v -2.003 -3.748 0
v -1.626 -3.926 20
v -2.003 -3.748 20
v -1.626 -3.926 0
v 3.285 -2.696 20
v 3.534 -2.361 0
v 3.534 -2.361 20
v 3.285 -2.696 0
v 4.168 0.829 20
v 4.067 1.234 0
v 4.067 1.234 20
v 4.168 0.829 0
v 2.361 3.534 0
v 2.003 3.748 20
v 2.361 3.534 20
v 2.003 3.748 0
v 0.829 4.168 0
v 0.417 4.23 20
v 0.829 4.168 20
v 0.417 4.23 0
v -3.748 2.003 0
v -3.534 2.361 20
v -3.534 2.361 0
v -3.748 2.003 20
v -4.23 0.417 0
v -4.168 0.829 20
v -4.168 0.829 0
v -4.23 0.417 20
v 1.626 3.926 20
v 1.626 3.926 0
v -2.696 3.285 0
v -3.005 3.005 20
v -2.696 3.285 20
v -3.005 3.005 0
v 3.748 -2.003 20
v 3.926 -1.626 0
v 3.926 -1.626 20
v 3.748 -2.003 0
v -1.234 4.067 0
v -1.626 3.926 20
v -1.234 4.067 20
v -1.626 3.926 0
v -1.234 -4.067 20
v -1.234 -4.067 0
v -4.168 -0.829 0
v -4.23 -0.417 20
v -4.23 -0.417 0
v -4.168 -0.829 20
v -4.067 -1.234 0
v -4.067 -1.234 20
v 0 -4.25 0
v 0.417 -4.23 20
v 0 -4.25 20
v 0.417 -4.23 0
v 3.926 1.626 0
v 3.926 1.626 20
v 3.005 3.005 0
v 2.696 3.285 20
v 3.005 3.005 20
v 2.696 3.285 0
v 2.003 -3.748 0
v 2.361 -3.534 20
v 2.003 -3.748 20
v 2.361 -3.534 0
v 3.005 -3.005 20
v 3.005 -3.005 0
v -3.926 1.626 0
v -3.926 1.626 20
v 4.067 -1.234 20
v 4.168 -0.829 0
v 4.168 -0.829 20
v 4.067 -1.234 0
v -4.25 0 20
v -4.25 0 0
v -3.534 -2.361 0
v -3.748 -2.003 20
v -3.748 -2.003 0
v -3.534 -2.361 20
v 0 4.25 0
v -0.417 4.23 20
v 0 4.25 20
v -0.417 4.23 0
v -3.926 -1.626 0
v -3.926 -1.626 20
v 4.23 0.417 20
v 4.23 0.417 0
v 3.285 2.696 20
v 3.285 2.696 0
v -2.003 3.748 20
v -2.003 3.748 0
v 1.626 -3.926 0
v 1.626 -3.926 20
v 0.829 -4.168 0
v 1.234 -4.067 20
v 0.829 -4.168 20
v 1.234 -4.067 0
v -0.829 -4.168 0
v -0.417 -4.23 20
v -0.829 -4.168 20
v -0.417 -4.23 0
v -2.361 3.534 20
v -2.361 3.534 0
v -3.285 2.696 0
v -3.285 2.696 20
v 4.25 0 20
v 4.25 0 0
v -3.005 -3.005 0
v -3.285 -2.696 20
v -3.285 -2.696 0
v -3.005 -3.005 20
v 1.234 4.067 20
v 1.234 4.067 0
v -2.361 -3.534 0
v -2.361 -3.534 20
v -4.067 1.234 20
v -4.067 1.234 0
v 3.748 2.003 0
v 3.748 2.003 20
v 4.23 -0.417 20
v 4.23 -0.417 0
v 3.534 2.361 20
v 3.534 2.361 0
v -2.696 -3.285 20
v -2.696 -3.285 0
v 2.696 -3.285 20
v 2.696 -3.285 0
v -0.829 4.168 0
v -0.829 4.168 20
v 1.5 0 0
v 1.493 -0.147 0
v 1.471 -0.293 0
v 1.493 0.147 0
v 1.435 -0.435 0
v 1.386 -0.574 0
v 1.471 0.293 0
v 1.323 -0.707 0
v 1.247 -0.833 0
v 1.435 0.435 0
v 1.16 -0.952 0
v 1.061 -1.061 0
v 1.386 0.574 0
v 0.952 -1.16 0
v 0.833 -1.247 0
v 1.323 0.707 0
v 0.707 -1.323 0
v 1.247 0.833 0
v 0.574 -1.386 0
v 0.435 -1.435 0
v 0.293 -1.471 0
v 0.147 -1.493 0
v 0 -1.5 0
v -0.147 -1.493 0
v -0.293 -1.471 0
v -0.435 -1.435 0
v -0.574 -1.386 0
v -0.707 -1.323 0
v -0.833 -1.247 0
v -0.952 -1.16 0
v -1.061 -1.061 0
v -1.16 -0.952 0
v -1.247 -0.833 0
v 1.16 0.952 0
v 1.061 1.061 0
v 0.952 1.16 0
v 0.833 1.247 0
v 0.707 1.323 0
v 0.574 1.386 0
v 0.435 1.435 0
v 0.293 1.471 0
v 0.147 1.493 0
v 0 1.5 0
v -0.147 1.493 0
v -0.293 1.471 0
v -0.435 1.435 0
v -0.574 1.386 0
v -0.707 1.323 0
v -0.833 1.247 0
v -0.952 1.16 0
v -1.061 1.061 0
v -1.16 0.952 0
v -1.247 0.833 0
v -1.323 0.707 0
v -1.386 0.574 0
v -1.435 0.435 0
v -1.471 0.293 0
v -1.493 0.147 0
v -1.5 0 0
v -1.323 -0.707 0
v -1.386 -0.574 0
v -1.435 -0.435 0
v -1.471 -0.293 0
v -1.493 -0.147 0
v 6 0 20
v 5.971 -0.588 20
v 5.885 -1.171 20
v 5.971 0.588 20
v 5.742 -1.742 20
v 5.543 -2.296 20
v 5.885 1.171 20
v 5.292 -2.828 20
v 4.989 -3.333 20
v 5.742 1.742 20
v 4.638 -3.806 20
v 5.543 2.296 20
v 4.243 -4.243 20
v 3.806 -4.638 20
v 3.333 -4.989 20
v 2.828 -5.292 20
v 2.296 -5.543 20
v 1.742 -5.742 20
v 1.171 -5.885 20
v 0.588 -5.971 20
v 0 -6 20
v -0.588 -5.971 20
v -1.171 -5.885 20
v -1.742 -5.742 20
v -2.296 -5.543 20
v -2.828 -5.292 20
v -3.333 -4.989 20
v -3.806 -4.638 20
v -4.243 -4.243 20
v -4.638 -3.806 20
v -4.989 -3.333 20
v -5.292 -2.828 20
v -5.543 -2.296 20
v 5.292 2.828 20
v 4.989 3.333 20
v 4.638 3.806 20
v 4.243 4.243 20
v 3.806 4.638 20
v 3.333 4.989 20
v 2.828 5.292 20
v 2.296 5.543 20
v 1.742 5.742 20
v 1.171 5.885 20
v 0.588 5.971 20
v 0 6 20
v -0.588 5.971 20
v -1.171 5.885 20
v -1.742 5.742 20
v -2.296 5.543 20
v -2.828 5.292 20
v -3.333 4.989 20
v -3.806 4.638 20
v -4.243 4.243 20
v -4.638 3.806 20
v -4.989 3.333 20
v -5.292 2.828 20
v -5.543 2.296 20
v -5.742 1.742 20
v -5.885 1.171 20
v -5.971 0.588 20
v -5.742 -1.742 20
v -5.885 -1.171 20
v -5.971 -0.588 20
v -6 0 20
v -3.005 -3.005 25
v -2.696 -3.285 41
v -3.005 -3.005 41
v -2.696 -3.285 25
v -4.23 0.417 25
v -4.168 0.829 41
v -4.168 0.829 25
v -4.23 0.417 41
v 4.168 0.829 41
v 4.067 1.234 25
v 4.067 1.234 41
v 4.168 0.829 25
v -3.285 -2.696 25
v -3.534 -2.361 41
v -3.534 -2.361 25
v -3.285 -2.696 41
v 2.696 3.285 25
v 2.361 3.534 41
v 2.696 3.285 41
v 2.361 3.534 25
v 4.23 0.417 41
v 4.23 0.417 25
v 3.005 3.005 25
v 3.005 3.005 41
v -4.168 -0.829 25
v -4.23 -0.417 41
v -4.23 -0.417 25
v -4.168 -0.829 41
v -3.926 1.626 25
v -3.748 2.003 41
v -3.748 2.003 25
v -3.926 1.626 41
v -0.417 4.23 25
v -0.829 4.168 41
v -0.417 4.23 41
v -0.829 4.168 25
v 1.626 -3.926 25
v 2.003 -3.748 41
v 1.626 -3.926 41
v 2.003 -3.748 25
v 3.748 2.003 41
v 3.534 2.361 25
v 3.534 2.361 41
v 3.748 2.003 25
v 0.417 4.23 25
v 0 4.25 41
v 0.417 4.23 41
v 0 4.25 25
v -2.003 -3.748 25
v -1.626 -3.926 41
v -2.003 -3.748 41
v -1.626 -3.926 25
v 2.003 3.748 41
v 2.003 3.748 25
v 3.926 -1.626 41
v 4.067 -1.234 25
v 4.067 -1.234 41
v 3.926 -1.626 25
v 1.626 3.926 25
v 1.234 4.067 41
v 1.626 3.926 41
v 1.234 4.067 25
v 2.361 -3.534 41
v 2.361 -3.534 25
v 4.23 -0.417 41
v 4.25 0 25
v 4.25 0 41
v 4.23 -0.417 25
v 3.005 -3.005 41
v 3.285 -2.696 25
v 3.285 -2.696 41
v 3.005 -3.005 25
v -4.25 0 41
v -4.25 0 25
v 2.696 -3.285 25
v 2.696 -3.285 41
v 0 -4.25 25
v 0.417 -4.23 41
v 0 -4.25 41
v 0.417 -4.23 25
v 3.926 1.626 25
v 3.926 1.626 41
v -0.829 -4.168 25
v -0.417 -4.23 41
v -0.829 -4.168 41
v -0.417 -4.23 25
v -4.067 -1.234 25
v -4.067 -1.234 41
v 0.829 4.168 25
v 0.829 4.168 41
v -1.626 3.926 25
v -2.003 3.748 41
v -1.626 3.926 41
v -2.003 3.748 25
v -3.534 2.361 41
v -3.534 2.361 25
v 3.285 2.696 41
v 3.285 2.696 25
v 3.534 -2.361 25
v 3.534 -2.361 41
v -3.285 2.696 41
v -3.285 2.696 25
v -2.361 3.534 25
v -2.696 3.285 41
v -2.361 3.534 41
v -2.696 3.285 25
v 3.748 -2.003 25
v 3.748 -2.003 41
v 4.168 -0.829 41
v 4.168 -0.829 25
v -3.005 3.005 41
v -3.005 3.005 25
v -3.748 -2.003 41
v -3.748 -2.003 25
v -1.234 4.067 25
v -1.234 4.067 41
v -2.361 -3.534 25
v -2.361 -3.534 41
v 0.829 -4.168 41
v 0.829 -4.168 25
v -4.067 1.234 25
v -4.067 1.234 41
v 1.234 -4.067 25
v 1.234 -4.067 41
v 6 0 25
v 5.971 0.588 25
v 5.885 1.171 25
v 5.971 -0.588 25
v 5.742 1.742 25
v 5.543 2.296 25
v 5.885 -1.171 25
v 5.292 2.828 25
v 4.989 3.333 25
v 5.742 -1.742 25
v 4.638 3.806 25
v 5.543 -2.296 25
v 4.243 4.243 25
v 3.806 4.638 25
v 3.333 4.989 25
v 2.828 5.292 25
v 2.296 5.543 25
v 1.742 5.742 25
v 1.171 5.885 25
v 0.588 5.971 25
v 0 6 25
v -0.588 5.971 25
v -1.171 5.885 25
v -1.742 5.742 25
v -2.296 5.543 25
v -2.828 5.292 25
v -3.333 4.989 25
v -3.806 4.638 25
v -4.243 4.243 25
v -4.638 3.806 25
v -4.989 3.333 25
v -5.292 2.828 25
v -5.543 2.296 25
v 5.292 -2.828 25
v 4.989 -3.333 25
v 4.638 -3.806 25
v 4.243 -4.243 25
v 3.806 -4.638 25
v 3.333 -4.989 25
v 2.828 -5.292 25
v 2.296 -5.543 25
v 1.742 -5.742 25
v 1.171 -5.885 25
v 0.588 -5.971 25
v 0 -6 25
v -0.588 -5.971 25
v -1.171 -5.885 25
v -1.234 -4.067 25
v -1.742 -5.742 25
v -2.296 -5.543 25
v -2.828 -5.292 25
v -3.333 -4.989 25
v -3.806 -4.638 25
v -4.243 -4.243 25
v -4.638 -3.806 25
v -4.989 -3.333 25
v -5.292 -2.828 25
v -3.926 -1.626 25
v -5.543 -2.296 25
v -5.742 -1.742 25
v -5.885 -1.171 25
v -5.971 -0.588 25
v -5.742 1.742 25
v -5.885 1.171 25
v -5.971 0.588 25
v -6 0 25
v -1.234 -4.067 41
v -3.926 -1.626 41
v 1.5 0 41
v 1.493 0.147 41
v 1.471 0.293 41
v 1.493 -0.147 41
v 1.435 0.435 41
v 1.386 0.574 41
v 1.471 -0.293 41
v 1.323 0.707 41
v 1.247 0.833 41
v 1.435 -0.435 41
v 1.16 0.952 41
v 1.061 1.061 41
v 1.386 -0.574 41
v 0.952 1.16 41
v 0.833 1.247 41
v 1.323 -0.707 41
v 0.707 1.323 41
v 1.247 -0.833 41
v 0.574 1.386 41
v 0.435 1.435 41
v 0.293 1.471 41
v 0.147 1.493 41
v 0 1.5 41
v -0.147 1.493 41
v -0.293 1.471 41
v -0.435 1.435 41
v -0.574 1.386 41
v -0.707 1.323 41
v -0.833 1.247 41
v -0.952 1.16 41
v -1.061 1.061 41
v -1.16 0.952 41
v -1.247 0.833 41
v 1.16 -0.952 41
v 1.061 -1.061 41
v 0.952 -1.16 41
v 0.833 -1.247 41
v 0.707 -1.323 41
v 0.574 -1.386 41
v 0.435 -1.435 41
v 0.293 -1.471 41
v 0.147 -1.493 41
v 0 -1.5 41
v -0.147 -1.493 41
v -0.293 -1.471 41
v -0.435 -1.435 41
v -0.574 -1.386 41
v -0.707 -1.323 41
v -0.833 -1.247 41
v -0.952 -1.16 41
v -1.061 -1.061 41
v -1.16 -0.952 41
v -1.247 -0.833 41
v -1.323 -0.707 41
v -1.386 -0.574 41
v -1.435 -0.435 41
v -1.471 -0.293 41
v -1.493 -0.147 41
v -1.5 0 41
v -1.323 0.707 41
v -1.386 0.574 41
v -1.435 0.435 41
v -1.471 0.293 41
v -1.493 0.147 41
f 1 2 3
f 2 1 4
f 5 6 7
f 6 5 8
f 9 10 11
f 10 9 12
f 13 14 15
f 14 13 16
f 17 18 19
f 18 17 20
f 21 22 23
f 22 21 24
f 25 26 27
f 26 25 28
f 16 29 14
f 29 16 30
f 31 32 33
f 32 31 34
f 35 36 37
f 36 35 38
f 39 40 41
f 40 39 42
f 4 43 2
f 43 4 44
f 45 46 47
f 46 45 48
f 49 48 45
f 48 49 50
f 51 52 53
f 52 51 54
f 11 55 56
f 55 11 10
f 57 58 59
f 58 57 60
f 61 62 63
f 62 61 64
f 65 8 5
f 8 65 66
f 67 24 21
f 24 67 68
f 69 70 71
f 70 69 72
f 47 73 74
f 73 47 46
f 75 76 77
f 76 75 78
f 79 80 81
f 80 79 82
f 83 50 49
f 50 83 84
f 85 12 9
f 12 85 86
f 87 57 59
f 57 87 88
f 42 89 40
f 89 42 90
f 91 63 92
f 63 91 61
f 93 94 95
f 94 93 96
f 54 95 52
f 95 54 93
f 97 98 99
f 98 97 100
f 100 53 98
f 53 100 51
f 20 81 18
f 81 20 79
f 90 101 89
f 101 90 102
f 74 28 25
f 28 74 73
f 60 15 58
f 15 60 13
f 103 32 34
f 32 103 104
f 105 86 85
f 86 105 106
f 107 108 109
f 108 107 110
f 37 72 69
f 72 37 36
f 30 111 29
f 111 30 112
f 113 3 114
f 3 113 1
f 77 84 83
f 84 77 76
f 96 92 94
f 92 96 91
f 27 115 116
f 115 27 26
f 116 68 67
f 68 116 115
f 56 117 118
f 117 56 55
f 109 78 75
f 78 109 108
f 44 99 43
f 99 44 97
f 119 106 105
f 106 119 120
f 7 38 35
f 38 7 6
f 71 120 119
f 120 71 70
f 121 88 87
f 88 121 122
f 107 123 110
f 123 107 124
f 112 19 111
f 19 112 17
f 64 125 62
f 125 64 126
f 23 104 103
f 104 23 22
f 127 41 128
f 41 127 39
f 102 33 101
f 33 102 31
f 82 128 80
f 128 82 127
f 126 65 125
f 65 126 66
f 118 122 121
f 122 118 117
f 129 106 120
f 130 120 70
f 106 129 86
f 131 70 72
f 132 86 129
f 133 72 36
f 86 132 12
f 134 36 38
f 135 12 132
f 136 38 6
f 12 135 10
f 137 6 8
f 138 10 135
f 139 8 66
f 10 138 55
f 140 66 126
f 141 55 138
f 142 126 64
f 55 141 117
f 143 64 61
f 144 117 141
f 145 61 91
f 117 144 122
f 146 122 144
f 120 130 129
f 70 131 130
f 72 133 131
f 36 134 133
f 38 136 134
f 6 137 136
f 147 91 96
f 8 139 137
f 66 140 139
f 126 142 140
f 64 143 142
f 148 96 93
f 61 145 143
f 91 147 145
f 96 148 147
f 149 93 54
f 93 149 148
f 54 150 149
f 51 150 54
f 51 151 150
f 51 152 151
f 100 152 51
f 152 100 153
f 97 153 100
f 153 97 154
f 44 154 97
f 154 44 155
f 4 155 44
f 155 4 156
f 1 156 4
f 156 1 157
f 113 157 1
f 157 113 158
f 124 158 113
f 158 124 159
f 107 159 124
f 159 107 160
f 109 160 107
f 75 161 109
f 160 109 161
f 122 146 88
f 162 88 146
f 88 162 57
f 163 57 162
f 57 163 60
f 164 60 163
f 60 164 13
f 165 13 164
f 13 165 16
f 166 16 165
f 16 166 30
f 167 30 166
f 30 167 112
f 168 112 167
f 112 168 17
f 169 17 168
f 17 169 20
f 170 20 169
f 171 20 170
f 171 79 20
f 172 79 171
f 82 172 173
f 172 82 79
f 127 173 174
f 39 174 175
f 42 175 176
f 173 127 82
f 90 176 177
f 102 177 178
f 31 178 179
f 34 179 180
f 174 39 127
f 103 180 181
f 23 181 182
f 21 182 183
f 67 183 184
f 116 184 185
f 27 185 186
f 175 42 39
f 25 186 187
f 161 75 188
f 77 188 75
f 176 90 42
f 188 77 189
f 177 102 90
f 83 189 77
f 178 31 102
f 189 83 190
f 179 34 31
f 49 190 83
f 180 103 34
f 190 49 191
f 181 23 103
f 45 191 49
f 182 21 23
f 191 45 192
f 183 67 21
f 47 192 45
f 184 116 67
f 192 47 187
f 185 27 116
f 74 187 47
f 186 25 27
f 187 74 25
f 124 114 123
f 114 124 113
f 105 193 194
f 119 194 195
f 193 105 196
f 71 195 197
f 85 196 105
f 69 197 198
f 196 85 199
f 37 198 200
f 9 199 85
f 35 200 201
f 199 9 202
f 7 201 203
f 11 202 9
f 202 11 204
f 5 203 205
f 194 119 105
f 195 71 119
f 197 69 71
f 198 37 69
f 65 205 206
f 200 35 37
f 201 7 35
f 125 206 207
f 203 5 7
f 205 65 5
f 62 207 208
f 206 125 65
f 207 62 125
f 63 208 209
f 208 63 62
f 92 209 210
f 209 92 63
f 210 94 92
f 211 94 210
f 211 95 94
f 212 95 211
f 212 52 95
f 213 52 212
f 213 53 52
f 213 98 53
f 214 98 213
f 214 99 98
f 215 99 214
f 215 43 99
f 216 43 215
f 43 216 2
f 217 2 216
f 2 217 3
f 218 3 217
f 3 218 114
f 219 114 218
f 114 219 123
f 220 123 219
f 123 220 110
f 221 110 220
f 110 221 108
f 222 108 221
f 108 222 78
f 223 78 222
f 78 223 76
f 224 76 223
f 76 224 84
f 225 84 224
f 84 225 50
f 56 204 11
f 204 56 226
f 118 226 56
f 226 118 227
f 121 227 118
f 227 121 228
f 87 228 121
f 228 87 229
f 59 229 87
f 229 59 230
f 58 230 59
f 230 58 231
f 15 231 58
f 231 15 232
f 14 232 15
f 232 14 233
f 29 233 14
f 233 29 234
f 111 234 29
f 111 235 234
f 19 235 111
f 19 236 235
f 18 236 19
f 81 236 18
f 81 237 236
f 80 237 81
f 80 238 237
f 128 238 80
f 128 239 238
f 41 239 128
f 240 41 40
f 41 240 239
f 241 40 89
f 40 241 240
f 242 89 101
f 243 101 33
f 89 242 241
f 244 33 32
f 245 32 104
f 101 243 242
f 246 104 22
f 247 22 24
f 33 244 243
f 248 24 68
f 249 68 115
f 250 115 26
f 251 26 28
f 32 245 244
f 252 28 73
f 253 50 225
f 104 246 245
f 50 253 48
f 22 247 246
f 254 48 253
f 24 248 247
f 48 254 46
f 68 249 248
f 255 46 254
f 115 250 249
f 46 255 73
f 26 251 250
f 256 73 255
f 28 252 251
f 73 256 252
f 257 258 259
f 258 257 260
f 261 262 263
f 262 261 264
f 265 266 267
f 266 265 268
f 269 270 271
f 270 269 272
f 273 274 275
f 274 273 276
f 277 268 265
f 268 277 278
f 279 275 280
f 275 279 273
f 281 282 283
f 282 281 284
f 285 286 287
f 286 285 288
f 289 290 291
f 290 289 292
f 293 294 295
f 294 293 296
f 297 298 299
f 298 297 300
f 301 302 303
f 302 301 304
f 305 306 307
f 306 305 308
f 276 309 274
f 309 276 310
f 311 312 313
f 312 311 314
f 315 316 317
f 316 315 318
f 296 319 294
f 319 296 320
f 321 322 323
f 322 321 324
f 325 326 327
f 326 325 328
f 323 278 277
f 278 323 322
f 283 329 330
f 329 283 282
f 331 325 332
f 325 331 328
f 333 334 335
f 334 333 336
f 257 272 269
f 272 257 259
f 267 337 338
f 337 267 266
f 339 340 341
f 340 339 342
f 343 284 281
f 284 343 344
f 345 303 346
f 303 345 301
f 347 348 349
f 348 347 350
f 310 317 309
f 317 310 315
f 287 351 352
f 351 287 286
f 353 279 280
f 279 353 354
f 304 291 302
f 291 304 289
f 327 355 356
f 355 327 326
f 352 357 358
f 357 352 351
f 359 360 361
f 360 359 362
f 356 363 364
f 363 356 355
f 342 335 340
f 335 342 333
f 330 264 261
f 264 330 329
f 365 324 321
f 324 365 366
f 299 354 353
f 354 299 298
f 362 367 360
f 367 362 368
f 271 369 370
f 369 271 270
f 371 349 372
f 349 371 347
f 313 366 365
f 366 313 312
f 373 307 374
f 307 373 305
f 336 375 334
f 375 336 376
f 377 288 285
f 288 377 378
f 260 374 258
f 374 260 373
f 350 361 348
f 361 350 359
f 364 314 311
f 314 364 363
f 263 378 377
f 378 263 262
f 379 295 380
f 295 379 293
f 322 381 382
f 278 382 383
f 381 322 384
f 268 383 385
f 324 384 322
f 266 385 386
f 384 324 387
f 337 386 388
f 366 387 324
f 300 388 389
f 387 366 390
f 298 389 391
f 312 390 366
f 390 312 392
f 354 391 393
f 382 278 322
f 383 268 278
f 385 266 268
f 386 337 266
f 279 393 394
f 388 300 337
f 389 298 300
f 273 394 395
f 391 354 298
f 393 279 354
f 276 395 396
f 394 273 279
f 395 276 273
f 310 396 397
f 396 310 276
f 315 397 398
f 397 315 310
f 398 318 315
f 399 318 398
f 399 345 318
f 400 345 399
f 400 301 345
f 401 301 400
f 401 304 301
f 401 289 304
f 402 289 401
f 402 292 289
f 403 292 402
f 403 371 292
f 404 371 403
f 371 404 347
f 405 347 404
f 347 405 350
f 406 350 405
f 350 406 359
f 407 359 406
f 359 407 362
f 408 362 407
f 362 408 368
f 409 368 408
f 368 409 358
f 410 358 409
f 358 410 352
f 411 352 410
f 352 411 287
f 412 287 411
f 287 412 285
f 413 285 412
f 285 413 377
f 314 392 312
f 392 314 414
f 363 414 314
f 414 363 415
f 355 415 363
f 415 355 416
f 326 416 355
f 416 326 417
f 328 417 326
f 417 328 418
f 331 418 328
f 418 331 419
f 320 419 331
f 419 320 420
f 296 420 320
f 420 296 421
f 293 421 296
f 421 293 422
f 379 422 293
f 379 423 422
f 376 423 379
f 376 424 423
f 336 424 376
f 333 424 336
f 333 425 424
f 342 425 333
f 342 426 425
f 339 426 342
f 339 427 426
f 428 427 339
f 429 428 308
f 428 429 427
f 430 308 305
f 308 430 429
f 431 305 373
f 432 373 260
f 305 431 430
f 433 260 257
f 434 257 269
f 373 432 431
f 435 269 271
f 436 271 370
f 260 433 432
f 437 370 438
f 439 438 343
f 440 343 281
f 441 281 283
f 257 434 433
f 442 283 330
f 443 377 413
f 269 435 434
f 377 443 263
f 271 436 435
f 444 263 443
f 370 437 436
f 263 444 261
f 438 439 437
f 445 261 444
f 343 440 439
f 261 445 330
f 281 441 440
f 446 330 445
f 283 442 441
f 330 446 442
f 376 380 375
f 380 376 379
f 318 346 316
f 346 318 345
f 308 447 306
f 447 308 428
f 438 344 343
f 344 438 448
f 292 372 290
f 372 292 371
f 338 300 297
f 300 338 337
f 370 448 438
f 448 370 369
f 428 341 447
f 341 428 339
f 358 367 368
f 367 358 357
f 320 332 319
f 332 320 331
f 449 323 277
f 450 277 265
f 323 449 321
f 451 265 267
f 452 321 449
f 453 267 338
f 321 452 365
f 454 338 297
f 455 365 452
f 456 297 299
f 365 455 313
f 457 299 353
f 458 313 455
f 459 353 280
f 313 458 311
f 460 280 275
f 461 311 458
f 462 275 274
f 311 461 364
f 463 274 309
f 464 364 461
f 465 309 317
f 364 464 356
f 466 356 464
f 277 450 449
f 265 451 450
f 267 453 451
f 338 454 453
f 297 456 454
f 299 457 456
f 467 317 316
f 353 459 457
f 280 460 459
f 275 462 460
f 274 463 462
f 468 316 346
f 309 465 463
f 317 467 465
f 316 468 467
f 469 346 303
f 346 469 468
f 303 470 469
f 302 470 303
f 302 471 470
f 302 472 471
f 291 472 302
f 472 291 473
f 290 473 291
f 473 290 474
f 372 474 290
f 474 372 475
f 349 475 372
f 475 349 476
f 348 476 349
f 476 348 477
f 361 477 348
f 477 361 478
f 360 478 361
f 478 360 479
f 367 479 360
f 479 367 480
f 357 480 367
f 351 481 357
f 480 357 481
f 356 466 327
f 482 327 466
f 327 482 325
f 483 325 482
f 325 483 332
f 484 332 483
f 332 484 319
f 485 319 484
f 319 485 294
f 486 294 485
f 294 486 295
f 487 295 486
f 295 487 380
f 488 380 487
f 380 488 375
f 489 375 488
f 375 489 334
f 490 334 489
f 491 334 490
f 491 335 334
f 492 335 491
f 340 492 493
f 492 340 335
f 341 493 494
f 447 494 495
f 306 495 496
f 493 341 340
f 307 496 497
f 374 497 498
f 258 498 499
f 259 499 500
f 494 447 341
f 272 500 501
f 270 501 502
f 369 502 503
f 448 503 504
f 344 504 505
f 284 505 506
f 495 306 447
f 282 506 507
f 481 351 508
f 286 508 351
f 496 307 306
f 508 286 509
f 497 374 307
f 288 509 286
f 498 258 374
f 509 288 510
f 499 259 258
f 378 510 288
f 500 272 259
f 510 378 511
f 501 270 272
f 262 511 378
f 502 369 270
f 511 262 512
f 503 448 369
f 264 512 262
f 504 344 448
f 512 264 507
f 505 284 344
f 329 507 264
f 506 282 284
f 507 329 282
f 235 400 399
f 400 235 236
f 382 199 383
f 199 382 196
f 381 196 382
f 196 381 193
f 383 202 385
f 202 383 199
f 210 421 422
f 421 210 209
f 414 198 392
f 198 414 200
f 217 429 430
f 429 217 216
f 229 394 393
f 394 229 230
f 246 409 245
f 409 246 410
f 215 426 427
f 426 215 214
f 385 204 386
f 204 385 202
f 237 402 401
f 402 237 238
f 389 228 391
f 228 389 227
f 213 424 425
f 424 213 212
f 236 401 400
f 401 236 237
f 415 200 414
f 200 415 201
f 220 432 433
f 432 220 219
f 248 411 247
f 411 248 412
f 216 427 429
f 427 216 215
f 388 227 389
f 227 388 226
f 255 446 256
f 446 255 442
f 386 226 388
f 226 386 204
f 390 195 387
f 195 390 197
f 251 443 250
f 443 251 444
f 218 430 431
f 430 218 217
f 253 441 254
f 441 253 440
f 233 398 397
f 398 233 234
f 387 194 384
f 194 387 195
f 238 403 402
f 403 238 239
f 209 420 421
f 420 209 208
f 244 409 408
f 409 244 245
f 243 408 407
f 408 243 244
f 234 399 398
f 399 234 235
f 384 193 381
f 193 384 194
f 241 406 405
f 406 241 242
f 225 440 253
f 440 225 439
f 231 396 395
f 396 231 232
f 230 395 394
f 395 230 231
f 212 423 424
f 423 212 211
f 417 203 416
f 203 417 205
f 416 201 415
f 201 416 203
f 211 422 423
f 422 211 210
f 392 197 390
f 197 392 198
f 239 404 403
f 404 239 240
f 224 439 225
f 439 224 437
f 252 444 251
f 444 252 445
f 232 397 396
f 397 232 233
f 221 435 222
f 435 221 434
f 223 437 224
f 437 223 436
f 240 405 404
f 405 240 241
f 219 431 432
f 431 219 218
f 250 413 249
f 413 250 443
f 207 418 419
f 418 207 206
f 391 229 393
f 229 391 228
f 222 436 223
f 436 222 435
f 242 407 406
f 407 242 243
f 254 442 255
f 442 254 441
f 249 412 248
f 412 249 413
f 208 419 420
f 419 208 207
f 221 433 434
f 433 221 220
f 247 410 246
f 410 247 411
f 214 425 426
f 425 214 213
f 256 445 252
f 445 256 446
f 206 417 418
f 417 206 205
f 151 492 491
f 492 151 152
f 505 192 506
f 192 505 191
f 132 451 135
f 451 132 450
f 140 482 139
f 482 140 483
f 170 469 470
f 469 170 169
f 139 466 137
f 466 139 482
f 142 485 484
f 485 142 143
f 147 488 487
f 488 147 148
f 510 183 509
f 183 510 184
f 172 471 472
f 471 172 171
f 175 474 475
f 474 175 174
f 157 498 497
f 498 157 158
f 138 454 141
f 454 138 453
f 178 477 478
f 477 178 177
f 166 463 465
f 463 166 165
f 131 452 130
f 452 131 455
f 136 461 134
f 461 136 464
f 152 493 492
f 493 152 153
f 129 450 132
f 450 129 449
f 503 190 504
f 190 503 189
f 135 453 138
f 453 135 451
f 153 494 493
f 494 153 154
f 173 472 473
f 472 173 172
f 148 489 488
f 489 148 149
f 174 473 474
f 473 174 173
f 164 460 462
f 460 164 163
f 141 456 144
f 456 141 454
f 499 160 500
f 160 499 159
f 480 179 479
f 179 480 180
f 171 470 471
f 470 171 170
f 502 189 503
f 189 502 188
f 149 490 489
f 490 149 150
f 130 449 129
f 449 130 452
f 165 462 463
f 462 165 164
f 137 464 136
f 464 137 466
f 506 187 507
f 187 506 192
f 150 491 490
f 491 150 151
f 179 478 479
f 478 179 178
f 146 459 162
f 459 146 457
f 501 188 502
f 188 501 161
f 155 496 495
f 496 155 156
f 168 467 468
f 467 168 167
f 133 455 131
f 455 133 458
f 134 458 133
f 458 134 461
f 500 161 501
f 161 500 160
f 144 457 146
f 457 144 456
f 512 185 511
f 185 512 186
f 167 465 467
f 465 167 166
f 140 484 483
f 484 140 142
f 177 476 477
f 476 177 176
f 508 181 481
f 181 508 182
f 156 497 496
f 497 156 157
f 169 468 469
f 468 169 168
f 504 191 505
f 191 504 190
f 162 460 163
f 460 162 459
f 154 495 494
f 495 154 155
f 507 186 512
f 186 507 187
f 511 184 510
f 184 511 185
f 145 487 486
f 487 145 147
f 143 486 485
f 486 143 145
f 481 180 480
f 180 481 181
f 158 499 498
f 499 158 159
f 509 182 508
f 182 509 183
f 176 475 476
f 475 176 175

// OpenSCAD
// Hose-barb reducer: joins 8 mm ID silicone tubing to 5 mm ID silicone tubing
// Print orientation: standing upright along +Z, centred on origin in X/Y
// Units: mm

// ---------------- Parameters ----------------
// Tubing inner diameters
tubing_id_8   = 8;    // larger tubing (8 mm ID)
tubing_id_5   = 5;    // smaller tubing (5 mm ID)

// Barb dimensions (8 mm tubing side)
barb_h_8      = 10;   // height of each 8 mm tubing barb
barb_od_8_bot = 7.5;  // outer diameter of 8 mm barb at its bottom
barb_od_8_top = 9.5;  // outer diameter of 8 mm barb at its top

// Collar dimensions
collar_h      = 5;    // height of the 12 mm cylindrical collar (z = 20 to 25)
collar_od     = 12;   // outer diameter of the collar

// Barb dimensions (5 mm tubing side)
barb_h_5      = 8;    // height of each 5 mm tubing barb
barb_od_5_bot = 6.5;  // outer diameter of 5 mm barb at its bottom
barb_od_5_top = 5.0;  // outer diameter of 5 mm barb at its top

// Bore
bore_d        = 3;    // diameter of the through-bore

// Derived / helper values
eps           = 0.5;  // overshoot for clean boolean cuts
sawtooth_d    = 8.5;  // diameter of the "teeth" that form the sawtooth profile

// ---------------- Model ----------------
difference() {
    union() {
        // ---- 8 mm tubing side (z = 0 to 20) ----
        for (i = [0 : 1]) {
            translate([0, 0, i * barb_h_8])
                linear_extrude(height = barb_h_8)
                    circle(d = sawtooth_d, $fn = 64);
        }

        // ---- Collar (z = 20 to 25) ----
        translate([0, 0, 20])
            cylinder(h = collar_h, d = collar_od, $fn = 64);

        // ---- 5 mm tubing side (z = 25 to 41) ----
        for (i = [0 : 1]) {
            translate([0, 0, 25 + i * barb_h_5])
                linear_extrude(height = barb_h_5)
                    circle(d = sawtooth_d, $fn = 64);
        }
    }

    // Through-bore along Z
    translate([0, 0, -eps])
        cylinder(h = 41 + 2 * eps, d = bore_d, $fn = 64);
}
